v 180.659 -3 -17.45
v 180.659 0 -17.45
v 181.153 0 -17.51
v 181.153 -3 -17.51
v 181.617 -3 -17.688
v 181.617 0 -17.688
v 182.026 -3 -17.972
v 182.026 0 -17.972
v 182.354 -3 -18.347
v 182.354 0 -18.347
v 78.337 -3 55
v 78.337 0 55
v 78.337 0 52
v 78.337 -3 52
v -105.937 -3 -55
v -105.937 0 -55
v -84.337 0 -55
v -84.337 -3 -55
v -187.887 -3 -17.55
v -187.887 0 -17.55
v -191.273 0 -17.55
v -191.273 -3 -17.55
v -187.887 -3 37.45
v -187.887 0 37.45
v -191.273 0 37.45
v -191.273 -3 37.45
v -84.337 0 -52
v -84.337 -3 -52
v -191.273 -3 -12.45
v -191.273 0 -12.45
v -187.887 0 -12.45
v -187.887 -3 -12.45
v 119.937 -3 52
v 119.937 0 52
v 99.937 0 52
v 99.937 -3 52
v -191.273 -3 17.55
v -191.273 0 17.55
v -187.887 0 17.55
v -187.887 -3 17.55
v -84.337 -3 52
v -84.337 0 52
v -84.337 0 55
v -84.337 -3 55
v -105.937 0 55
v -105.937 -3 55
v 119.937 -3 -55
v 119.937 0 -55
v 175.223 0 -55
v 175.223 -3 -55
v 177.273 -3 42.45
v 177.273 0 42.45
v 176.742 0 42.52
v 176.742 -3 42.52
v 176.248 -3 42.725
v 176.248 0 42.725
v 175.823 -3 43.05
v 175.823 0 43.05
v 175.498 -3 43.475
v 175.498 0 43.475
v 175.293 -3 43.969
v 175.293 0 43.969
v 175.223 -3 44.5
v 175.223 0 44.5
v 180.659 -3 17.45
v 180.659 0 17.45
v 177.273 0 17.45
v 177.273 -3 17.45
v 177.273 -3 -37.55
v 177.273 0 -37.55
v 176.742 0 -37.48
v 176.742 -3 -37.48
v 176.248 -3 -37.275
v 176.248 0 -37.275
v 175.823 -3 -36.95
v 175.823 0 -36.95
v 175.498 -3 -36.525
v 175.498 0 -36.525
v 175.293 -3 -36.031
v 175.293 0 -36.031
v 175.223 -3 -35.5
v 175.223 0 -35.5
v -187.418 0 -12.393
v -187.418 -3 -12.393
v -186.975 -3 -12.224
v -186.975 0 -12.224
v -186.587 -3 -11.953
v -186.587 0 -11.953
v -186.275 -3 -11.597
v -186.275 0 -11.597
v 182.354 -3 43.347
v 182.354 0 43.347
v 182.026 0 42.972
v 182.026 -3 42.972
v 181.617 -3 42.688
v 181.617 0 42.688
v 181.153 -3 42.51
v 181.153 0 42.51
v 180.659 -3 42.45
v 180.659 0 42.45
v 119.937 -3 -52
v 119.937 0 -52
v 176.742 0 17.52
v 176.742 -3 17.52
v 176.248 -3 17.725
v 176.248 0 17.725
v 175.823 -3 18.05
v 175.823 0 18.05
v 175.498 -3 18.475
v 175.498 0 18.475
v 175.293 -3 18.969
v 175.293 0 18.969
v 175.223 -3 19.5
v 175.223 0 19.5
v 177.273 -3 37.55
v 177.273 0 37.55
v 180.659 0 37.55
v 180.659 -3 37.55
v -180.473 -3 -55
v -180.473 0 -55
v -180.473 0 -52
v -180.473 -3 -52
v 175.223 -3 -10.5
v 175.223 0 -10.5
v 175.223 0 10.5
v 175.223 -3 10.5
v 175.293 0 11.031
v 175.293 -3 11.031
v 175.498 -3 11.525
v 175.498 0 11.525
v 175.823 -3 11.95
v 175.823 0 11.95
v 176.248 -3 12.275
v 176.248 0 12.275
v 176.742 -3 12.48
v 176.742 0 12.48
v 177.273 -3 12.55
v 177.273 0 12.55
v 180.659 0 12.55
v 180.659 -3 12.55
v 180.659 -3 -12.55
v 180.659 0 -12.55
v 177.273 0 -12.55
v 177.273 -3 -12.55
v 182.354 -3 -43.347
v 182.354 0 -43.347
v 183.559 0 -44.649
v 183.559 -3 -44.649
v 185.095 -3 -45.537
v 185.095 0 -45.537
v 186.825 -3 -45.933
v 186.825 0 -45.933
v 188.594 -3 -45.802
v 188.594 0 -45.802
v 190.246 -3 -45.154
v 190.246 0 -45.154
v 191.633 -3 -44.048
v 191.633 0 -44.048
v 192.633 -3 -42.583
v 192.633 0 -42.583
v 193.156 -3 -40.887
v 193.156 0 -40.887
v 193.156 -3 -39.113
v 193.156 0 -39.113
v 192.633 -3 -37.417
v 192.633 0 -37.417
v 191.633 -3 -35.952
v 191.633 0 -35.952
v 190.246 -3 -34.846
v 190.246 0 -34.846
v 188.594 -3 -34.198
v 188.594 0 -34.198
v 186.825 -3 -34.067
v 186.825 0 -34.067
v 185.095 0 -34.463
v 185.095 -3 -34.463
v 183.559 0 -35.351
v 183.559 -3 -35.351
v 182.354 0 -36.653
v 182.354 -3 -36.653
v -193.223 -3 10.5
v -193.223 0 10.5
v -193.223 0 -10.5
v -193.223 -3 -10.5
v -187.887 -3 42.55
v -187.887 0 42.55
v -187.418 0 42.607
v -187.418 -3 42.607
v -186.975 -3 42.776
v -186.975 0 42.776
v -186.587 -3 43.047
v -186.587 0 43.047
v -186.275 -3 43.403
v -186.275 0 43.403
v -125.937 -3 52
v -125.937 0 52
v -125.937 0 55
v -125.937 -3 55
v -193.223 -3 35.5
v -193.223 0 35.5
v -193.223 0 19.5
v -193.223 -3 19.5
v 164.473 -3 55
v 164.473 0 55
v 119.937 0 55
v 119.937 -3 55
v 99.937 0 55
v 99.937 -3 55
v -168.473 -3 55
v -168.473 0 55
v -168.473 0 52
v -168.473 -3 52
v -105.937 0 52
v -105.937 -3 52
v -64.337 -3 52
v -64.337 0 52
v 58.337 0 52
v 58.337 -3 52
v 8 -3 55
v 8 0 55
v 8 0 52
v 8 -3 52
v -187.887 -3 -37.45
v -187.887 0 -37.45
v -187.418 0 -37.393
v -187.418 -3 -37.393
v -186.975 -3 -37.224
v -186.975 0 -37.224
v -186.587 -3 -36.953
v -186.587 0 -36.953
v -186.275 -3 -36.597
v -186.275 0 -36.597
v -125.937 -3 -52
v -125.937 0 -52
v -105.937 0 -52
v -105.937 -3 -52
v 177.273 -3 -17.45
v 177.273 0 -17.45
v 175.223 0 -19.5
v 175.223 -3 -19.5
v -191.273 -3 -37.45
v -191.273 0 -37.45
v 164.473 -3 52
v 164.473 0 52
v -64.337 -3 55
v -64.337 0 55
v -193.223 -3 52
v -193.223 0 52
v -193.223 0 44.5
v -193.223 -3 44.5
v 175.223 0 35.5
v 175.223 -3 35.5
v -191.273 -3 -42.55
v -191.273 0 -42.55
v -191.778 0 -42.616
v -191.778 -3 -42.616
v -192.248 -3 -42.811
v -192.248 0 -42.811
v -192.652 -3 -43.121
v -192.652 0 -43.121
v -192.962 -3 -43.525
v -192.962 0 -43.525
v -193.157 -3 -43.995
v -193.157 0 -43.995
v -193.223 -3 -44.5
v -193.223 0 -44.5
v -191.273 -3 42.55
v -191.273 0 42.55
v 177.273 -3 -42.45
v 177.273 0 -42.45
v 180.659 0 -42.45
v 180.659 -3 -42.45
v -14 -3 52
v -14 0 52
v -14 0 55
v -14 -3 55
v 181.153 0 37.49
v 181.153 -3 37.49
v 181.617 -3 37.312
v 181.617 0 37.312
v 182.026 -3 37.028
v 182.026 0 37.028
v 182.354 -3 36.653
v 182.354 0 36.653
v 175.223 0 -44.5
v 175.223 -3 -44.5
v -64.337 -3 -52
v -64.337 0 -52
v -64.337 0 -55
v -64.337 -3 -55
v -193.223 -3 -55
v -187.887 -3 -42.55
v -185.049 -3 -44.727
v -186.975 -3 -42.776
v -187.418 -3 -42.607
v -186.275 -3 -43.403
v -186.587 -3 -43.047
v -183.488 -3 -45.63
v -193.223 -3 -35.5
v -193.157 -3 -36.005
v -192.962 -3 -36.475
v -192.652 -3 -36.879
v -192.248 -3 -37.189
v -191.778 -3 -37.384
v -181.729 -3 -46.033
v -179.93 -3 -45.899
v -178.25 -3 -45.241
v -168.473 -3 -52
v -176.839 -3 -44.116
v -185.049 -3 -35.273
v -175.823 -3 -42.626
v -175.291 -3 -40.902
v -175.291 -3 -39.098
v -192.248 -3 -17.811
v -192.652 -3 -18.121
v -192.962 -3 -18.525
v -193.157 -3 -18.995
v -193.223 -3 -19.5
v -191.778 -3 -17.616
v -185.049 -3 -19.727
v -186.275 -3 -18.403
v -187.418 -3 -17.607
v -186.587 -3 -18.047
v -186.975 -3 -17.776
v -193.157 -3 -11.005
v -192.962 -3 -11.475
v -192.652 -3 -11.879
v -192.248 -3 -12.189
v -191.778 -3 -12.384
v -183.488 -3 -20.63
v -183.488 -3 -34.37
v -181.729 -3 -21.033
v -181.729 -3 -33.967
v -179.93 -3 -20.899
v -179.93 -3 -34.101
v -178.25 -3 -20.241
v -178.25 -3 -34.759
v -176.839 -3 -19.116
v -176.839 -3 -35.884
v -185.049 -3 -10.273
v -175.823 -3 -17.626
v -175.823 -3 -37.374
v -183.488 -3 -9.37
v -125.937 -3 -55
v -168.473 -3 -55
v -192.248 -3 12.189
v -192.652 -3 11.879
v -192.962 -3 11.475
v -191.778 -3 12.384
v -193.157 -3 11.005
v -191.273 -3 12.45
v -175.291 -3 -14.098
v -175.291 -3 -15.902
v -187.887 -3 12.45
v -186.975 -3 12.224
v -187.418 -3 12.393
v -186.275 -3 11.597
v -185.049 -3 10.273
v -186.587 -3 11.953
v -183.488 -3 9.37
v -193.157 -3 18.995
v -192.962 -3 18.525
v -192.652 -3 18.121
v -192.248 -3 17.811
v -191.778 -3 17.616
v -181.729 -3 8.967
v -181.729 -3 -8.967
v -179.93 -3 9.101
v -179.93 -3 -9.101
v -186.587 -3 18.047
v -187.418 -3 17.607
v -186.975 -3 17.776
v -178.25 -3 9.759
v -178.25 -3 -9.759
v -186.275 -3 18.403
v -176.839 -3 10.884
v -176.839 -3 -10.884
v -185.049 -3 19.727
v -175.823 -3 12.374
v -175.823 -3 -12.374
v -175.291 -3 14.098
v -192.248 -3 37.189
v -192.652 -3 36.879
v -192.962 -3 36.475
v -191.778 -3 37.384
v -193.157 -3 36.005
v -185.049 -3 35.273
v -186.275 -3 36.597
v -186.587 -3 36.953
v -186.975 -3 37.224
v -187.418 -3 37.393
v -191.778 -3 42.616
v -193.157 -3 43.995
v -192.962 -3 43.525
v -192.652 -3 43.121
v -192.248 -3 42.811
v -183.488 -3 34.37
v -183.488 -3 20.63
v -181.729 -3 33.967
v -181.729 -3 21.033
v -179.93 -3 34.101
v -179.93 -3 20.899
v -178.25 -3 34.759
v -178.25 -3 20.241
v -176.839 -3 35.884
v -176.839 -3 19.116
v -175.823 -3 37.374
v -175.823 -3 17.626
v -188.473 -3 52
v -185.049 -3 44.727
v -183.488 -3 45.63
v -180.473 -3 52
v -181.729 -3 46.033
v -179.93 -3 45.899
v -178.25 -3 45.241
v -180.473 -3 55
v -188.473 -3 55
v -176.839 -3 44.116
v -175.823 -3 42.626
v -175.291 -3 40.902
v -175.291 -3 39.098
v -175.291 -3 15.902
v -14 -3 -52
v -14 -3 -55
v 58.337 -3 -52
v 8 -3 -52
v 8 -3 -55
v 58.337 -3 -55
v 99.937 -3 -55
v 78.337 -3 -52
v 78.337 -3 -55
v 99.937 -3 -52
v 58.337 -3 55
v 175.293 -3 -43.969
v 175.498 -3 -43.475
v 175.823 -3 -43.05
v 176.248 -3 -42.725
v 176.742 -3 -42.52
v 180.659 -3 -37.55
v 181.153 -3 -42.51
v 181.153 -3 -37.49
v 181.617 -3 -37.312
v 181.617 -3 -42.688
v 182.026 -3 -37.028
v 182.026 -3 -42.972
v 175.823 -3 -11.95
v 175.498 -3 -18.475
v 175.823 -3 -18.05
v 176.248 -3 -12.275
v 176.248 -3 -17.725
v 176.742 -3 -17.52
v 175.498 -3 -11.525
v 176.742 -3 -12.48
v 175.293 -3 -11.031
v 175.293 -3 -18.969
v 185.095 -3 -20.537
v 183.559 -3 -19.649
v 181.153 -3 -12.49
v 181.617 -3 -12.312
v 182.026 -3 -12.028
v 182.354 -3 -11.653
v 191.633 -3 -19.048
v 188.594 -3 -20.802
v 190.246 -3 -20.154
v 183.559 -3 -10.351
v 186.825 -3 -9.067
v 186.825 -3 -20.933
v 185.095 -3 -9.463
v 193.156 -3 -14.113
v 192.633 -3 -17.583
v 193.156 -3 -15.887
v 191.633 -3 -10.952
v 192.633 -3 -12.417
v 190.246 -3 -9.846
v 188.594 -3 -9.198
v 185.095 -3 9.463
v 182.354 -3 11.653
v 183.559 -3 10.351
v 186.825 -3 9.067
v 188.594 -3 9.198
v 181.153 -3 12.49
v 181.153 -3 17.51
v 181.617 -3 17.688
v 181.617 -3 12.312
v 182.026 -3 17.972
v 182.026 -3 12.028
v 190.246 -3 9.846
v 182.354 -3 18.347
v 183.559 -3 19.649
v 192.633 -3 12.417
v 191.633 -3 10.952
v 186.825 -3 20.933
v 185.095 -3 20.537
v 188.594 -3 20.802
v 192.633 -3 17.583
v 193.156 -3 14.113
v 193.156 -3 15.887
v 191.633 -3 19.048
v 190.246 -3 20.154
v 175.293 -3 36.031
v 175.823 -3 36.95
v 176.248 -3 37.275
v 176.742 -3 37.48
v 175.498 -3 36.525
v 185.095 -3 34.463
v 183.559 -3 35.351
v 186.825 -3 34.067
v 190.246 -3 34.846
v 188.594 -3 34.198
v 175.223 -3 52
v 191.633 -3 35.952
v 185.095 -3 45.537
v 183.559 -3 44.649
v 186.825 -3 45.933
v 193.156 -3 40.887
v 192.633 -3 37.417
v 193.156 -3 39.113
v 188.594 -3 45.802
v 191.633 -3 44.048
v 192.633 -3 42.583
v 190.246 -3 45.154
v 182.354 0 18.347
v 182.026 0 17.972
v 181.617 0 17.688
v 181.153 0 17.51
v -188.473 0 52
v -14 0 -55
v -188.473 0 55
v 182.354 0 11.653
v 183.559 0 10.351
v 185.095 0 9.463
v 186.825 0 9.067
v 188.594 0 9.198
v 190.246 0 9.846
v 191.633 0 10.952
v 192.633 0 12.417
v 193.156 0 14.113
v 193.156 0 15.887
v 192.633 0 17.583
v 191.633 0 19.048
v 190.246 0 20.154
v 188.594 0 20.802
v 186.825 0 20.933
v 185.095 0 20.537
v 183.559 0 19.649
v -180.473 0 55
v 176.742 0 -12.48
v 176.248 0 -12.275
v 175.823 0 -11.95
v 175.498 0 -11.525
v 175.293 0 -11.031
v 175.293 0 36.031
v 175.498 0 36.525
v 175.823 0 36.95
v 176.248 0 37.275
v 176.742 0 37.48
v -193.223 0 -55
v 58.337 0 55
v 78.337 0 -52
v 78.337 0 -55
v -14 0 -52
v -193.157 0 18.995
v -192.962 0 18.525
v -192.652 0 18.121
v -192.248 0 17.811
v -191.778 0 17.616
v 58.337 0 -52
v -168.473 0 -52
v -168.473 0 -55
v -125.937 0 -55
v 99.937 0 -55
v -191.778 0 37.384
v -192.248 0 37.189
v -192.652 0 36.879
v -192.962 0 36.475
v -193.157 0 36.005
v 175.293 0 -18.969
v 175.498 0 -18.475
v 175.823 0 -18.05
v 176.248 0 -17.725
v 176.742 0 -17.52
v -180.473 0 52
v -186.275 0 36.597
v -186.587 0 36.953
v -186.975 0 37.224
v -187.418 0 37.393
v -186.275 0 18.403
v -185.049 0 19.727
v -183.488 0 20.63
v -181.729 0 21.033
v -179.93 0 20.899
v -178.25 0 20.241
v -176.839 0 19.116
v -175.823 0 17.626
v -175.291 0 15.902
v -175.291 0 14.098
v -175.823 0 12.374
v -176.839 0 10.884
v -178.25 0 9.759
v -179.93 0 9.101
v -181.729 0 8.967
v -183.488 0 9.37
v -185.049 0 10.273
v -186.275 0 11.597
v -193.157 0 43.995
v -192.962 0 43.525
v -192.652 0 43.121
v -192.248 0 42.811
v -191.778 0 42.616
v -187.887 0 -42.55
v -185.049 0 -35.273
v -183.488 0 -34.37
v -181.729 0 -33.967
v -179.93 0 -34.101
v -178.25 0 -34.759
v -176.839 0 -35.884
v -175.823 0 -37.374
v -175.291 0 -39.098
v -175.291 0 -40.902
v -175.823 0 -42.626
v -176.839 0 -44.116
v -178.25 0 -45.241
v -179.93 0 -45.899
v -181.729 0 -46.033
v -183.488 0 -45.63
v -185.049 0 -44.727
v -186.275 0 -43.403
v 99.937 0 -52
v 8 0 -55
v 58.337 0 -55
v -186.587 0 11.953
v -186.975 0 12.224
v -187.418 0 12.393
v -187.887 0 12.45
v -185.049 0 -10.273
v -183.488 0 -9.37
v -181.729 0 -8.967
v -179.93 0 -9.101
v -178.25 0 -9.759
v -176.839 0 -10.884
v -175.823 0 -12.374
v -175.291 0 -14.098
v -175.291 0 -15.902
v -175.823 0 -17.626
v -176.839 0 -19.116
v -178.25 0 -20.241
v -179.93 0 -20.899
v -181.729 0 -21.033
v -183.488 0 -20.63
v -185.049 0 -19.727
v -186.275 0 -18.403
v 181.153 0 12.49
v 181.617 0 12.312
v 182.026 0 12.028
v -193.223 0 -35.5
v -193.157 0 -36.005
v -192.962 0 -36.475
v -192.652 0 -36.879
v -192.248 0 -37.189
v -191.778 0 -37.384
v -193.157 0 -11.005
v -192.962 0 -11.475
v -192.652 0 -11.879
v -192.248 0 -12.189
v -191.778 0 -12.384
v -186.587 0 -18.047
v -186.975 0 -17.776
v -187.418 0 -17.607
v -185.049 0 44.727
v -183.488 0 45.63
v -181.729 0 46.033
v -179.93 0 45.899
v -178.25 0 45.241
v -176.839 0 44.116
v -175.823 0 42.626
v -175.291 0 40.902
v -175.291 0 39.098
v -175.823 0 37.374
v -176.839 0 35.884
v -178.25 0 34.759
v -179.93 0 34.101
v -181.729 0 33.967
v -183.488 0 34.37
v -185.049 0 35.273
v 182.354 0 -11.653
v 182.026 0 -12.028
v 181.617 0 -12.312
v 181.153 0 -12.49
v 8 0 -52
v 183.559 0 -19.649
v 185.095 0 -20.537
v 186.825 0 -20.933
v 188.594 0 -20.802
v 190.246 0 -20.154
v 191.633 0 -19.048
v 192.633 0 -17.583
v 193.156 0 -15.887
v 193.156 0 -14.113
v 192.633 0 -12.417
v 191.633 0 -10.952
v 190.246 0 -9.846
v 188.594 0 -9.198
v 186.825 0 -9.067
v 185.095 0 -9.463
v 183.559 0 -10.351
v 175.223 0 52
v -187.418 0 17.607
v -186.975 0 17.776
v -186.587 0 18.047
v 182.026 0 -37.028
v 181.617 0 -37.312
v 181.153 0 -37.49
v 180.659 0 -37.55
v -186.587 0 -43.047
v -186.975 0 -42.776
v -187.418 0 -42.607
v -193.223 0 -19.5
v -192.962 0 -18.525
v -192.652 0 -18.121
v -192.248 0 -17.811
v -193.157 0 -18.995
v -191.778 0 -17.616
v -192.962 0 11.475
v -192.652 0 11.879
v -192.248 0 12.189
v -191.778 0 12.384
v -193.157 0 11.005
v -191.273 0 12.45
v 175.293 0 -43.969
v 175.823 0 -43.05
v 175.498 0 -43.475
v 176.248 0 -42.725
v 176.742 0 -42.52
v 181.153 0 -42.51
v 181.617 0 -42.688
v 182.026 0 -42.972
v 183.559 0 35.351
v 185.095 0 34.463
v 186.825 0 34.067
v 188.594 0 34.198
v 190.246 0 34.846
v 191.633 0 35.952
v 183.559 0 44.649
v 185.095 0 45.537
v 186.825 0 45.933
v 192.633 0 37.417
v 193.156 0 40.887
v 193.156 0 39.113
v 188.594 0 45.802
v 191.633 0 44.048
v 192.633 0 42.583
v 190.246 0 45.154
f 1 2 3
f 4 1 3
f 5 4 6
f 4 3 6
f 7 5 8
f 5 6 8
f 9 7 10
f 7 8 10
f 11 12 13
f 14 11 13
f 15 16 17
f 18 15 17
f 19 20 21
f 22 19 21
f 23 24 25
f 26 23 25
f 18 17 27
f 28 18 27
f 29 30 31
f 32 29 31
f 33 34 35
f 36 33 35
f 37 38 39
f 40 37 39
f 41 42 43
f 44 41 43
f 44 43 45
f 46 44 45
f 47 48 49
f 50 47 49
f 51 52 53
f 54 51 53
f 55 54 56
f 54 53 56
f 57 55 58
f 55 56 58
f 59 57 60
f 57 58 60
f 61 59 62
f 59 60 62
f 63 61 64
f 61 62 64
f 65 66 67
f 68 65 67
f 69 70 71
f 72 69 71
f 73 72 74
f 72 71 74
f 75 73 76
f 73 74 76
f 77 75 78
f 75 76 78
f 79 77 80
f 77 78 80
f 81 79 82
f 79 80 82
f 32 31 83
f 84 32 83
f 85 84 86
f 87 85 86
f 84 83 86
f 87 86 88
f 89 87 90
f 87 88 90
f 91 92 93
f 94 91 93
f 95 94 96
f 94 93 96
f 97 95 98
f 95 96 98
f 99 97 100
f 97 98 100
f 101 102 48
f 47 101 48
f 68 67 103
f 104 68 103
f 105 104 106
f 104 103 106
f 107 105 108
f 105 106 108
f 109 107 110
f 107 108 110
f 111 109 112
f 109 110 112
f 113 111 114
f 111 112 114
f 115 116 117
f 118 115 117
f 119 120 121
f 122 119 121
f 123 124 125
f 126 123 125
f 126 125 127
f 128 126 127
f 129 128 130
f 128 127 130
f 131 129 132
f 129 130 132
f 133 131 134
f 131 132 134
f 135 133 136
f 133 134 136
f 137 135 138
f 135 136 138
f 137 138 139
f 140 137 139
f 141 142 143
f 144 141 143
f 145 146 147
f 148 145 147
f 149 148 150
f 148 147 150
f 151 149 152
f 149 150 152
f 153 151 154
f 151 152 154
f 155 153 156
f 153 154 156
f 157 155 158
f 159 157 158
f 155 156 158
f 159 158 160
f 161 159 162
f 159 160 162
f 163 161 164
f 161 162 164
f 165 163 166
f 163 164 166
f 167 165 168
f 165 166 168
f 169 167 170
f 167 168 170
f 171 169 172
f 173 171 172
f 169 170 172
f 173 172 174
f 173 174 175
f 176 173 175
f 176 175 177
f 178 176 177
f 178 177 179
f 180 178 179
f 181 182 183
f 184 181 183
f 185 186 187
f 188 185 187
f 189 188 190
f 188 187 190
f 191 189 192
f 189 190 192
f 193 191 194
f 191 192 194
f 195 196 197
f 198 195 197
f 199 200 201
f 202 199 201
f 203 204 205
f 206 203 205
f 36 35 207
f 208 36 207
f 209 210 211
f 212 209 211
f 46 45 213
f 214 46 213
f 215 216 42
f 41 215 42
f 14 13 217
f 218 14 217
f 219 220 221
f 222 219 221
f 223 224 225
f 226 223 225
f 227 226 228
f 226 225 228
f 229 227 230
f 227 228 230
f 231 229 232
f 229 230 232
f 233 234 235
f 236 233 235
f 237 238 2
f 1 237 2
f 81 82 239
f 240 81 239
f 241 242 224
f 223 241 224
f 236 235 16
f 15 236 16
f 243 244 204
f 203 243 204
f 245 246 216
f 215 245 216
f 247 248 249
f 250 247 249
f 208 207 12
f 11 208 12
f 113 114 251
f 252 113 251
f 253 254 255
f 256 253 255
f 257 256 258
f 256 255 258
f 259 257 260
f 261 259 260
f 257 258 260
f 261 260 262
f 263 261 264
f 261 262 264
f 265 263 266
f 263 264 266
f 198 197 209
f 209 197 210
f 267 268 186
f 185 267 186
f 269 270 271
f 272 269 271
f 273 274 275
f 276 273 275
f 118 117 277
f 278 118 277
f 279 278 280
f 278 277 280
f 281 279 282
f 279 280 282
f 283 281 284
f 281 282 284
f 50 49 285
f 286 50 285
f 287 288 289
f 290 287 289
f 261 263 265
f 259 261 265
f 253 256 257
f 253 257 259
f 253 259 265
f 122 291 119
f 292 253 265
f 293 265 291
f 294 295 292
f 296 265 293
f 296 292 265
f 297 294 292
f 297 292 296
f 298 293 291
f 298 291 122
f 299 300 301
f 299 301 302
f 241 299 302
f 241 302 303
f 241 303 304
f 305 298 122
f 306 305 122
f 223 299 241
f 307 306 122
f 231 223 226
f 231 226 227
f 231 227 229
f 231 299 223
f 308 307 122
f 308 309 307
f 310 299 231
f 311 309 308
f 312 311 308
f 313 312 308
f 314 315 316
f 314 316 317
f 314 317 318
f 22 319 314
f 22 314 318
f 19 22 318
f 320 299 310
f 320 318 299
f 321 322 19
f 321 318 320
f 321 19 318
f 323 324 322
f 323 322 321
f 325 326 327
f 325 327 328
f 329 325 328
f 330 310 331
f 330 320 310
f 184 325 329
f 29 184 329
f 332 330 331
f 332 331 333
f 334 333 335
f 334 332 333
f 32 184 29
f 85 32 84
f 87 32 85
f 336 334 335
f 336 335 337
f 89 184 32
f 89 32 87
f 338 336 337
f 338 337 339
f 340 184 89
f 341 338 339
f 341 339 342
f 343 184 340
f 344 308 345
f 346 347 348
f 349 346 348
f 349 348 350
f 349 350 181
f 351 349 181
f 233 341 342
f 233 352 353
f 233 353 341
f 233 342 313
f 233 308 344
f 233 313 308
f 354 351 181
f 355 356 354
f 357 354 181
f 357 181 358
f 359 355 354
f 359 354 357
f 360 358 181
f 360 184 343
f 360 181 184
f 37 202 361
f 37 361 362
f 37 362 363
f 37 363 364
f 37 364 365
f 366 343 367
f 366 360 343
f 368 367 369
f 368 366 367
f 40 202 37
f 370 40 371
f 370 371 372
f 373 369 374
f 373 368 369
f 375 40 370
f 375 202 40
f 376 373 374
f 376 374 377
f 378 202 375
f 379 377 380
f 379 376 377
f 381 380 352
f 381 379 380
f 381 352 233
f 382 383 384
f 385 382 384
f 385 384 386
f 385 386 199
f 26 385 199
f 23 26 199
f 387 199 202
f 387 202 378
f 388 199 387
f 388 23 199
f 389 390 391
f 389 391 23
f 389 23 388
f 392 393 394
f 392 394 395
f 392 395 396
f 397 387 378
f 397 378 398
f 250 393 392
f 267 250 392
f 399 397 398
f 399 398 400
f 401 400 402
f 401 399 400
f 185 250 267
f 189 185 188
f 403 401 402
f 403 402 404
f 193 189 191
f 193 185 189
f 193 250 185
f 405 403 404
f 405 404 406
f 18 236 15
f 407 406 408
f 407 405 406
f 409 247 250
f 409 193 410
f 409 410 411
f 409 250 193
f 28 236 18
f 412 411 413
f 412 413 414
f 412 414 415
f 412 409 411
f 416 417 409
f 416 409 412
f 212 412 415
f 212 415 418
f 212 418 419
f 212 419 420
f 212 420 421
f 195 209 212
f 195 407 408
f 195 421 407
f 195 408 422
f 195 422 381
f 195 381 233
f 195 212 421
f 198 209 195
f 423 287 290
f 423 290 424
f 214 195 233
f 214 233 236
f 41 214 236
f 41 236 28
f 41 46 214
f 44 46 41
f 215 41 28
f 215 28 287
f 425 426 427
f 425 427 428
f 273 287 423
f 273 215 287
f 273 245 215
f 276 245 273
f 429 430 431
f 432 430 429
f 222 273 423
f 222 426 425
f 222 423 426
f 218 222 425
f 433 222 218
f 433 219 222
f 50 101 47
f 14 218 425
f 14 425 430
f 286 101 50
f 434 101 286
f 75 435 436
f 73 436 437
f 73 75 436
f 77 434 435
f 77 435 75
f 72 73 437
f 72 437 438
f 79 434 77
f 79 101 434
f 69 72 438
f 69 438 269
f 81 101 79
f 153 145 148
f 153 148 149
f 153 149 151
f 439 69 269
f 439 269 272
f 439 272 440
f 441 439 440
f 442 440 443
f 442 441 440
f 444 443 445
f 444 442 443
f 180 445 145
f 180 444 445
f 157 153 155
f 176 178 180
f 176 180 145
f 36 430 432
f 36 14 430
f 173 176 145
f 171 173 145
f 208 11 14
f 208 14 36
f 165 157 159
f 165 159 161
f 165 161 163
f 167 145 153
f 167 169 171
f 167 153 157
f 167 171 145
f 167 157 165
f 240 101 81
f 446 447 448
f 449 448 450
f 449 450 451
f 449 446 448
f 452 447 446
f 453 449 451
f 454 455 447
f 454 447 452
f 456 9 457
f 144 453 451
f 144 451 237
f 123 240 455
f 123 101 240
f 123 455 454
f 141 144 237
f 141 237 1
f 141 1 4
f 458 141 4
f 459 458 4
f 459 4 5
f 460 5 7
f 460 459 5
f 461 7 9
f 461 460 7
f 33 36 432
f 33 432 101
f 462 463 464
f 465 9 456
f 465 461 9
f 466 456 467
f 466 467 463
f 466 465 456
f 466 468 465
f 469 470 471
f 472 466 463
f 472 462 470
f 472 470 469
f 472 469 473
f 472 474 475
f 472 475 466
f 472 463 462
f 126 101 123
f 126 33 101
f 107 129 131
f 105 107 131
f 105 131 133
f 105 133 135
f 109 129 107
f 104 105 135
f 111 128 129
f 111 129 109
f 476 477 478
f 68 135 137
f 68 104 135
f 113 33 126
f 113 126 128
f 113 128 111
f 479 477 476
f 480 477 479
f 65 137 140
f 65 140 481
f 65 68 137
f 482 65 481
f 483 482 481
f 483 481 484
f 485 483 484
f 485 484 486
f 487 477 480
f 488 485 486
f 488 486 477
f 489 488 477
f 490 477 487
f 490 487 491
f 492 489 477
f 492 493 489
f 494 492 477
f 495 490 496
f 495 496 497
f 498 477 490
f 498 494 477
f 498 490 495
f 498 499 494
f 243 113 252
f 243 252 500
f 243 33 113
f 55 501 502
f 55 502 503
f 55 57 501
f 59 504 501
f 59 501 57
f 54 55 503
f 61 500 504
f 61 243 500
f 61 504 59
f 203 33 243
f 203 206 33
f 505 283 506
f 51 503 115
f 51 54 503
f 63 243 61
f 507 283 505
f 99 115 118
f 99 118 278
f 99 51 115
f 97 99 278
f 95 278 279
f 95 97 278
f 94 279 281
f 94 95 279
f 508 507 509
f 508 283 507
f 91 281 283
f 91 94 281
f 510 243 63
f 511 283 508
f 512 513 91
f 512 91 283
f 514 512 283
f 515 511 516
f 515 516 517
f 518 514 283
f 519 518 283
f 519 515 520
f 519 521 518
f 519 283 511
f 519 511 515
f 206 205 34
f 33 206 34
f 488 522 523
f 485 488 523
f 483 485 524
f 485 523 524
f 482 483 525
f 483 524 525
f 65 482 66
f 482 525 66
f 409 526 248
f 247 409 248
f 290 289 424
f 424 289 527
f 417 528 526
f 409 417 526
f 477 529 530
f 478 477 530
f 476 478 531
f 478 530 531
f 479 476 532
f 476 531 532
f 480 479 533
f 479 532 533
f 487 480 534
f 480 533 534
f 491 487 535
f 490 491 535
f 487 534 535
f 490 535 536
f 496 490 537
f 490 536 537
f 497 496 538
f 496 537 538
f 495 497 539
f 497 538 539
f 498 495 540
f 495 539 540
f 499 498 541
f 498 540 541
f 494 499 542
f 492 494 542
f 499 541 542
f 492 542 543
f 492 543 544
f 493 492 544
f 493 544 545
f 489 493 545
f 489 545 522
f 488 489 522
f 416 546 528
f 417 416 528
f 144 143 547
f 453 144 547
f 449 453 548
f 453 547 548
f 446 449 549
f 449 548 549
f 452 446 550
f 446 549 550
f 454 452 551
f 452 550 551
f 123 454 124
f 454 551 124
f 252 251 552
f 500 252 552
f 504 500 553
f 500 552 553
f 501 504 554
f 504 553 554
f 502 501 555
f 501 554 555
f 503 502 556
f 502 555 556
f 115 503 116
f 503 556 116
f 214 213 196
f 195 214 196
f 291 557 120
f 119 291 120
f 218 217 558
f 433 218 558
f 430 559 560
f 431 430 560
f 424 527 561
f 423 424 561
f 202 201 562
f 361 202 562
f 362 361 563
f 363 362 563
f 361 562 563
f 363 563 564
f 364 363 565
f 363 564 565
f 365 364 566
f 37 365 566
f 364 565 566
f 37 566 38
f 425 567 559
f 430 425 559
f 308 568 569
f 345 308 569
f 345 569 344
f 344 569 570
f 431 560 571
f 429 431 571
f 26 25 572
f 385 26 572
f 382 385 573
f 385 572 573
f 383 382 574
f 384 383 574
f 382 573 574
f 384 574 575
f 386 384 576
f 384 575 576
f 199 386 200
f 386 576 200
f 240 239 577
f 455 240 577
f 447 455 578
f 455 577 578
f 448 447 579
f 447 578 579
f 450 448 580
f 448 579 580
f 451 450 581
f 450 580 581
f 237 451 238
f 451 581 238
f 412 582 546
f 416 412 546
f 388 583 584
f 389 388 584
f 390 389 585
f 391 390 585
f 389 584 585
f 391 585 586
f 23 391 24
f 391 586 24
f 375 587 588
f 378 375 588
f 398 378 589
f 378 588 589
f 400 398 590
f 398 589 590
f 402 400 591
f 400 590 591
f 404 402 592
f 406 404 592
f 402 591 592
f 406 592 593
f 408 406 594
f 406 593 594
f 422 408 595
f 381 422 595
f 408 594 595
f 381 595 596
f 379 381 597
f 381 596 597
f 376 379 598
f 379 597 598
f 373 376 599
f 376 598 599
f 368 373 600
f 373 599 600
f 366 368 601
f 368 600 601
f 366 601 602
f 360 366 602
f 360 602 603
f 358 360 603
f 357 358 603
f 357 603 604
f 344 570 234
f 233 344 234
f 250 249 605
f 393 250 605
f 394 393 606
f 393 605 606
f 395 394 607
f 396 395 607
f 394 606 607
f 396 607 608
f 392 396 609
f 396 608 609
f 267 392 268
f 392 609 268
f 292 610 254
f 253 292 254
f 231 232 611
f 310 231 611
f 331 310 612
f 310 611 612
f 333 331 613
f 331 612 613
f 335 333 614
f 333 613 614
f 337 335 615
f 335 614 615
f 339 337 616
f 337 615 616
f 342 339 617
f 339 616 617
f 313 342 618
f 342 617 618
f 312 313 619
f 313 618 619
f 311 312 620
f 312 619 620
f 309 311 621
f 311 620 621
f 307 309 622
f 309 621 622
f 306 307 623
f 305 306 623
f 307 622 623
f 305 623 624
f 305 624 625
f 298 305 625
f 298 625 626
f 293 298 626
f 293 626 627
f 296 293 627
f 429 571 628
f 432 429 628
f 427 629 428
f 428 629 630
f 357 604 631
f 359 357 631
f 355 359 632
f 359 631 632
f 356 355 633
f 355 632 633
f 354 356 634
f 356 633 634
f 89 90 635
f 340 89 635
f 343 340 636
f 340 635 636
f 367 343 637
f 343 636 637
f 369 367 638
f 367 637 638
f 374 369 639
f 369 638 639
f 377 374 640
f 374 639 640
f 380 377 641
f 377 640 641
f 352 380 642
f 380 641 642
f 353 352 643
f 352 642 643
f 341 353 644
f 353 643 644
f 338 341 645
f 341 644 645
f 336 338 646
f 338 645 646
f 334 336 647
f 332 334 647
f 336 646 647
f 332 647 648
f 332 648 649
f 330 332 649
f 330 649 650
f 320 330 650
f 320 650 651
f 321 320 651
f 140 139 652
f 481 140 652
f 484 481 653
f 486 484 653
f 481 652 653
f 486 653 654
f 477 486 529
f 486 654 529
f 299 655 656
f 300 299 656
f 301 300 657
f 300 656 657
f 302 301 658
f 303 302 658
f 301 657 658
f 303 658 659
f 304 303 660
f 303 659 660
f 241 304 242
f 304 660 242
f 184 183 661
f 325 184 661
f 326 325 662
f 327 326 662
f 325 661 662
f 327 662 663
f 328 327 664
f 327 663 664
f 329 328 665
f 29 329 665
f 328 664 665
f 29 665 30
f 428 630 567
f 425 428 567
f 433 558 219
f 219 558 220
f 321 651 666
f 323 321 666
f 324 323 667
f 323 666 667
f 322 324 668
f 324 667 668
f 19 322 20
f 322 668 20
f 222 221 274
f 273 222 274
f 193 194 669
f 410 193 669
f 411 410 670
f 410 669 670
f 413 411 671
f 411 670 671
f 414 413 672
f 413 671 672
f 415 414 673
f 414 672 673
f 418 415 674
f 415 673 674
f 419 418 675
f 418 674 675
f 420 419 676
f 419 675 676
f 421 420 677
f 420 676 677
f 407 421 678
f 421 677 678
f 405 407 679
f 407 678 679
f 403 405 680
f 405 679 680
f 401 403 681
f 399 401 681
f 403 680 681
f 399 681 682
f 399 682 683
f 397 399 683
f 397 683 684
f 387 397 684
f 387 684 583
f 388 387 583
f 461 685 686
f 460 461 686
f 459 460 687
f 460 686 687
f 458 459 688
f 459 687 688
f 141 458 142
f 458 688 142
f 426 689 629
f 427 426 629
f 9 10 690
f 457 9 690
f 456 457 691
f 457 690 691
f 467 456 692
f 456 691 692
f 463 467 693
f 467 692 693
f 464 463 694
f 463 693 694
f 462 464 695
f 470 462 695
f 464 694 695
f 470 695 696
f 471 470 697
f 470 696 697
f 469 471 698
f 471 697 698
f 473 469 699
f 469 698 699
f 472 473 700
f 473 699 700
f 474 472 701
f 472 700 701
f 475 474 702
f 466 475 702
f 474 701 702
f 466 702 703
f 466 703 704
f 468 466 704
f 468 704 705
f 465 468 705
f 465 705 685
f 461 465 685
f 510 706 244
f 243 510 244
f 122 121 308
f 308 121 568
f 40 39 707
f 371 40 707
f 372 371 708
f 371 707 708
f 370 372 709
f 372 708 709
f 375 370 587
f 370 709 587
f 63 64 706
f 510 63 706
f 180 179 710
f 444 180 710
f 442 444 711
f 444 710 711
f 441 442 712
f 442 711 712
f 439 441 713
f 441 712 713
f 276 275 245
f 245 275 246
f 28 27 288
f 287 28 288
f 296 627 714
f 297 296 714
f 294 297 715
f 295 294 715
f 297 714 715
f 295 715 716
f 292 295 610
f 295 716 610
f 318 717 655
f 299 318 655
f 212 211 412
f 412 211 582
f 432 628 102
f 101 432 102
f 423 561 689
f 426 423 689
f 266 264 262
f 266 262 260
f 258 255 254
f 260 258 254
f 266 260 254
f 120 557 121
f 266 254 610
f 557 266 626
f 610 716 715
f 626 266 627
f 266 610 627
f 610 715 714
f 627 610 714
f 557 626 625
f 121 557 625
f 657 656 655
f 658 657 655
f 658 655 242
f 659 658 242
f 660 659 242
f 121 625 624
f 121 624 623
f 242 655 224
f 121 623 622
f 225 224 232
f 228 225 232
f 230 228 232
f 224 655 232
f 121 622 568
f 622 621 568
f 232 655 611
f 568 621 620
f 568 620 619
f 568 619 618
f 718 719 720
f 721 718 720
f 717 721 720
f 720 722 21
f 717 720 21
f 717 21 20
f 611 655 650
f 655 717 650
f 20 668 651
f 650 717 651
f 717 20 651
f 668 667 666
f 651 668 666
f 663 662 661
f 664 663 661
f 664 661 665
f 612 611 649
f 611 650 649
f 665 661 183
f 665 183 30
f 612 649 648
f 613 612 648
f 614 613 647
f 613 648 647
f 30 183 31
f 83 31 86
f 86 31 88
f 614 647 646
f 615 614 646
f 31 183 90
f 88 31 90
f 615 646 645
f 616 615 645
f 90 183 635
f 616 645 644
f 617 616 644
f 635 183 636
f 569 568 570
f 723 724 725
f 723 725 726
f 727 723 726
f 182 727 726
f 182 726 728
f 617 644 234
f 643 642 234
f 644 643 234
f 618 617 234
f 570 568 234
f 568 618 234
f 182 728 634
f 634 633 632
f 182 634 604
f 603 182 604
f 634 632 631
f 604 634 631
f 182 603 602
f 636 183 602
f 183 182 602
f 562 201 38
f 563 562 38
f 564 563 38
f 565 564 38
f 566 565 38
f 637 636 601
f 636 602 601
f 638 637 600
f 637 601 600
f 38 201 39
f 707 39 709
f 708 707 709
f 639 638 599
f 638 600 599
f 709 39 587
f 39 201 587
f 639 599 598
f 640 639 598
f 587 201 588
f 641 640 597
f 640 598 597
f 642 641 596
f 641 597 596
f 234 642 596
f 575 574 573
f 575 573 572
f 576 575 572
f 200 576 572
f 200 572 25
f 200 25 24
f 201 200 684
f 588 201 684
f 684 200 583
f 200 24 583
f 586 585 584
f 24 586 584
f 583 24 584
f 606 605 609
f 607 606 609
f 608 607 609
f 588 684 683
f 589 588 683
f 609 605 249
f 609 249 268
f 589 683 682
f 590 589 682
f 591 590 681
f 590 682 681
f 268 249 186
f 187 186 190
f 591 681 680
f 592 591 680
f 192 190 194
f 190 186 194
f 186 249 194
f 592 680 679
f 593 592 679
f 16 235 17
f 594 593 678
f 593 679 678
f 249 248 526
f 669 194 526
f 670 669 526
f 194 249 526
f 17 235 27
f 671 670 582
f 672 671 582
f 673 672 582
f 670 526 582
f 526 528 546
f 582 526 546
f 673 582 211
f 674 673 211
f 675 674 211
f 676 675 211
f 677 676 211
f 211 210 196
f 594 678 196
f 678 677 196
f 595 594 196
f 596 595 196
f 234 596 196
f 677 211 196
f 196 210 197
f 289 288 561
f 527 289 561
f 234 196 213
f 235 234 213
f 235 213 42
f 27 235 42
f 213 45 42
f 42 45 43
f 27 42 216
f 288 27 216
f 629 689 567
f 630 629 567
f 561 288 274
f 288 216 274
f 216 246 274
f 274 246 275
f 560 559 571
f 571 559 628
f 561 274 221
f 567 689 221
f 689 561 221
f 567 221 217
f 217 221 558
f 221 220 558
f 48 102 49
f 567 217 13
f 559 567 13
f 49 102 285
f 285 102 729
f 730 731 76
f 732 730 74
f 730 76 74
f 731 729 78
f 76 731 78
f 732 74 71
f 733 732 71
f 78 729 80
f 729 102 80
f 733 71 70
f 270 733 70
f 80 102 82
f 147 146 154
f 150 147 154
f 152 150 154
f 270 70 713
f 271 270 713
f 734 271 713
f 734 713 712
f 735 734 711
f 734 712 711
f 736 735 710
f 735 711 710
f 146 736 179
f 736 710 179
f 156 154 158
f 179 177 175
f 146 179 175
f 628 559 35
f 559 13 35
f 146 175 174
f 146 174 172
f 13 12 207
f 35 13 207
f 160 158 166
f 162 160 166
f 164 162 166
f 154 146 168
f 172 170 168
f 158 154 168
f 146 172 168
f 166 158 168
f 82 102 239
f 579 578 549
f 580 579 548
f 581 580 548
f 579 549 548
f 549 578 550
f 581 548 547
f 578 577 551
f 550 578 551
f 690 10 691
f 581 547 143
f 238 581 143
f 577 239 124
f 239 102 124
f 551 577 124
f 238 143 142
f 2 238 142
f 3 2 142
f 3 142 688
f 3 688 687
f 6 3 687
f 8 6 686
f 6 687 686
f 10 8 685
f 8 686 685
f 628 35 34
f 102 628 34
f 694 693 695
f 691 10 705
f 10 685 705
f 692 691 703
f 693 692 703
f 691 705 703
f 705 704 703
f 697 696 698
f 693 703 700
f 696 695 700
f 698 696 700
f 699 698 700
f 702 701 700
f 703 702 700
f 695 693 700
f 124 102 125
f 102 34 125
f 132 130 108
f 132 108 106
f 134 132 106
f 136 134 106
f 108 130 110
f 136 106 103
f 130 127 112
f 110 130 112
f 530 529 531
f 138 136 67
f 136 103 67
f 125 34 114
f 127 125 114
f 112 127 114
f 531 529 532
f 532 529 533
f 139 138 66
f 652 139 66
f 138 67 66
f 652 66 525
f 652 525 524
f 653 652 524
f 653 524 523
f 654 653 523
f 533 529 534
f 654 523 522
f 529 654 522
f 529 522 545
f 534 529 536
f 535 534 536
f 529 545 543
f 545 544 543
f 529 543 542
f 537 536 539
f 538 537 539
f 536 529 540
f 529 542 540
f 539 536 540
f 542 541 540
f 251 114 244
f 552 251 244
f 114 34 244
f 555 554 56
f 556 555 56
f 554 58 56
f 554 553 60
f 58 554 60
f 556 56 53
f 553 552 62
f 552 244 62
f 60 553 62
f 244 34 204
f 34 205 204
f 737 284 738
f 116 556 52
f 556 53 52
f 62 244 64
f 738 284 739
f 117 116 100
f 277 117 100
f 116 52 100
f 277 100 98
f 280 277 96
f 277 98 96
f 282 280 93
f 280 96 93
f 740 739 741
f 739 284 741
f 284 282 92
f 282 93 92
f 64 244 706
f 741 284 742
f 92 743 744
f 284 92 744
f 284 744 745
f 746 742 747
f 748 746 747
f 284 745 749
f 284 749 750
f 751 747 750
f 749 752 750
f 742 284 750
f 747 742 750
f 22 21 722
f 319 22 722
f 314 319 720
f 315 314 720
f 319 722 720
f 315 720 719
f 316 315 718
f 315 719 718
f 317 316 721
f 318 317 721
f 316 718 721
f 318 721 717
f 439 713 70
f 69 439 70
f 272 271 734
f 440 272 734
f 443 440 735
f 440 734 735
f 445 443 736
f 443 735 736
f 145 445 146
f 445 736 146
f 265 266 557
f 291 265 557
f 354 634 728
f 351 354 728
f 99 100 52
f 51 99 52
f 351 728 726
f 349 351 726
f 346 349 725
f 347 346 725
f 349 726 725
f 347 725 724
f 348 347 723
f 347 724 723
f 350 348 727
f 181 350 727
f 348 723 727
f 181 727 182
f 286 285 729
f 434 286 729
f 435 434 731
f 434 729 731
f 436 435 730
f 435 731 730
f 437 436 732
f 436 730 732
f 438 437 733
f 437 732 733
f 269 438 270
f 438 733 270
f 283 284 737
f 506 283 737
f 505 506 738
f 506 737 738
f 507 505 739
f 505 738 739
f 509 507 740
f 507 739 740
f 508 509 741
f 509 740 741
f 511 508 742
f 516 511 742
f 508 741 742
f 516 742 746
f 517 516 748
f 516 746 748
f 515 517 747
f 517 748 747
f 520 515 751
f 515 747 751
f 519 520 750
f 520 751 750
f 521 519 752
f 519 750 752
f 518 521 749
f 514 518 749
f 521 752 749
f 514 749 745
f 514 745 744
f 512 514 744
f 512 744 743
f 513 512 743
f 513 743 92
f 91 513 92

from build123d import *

# Parameters (mm, degrees)
F0_W     = 16.768251
F0_H     = 110
F0_W_2   = 16.76825
F1_DEPTH = 3


# Not quite as in the source:
# - ends of sketch curves that miss each other by under 0.0002 mm in the source are joined


with BuildPart() as f1:
    # F0 (on Front) → F1 (new body)
    with BuildSketch(Plane.XZ):
        with BuildLine():
            Line((-165.473004, -55), (-165.473004, 55))
            Line((-165.473004, 55), (-168.473004, 55))
            Line((-168.473004, 55), (-168.473004, 52))
            Line((-168.473004, 52), (-180.473004, 52))
            Line((-180.473004, 52), (-180.473004, 55))
            Line((-180.473004, 55), (-188.473004, 55))
            Line((-188.473004, 55), (-188.473004, 52))
            Line((-188.473004, 52), (-193.223004, 52))
            Line((-193.223004, 52), (-193.223004, 44.5))
            ThreePointArc((-193.223004, 44.5), (-192.6518622233, 43.1211417767), (-191.273004, 42.55))
            Line((-191.273004, 42.55), (-187.887382, 42.55))
            ThreePointArc((-187.887382, 42.55), (-186.9753529387, 42.7764272596), (-186.2751272015, 43.4031251371))
            ThreePointArc((-186.2751272015, 43.4031251371), (-175.223004, 40), (-186.2751273913, 36.5968747338))
            ThreePointArc((-186.2751273913, 36.5968747338), (-186.9753529387, 37.2235727404), (-187.887382, 37.45))
            Line((-187.887382, 37.45), (-191.273004, 37.45))
            ThreePointArc((-191.273004, 37.45), (-192.6518622233, 36.8788582233), (-193.223004, 35.5))
            Line((-193.223004, 35.5), (-193.223004, 19.5))
            ThreePointArc((-193.223004, 19.5), (-192.6518622233, 18.1211417767), (-191.273004, 17.55))
            Line((-191.273004, 17.55), (-187.887382, 17.55))
            ThreePointArc((-187.887382, 17.55), (-186.9753529387, 17.7764272596), (-186.2751272015, 18.4031251371))
            ThreePointArc((-186.2751272015, 18.4031251371), (-175.223004, 15), (-186.2751273913, 11.5968747338))
            ThreePointArc((-186.2751273913, 11.5968747338), (-186.9753529387, 12.2235727404), (-187.887382, 12.45))
            Line((-187.887382, 12.45), (-191.273004, 12.45))
            ThreePointArc((-191.273004, 12.45), (-192.6518622233, 11.8788582233), (-193.223004, 10.5))
            Line((-193.223004, 10.5), (-193.223004, -10.5))
            ThreePointArc((-193.223004, -10.5), (-192.6518622233, -11.8788582233), (-191.273004, -12.45))
            Line((-191.273004, -12.45), (-187.887382, -12.45))
            ThreePointArc((-187.887382, -12.45), (-186.9753529387, -12.2235727404), (-186.2751272015, -11.5968748629))
            ThreePointArc((-186.2751272015, -11.5968748629), (-175.223004, -15), (-186.2751273913, -18.4031252662))
            ThreePointArc((-186.2751273913, -18.4031252662), (-186.9753529387, -17.7764272596), (-187.887382, -17.55))
            Line((-187.887382, -17.55), (-191.273004, -17.55))
            ThreePointArc((-191.273004, -17.55), (-192.6518622233, -18.1211417767), (-193.223004, -19.5))
            Line((-193.223004, -19.5), (-193.223004, -35.5))
            ThreePointArc((-193.223004, -35.5), (-192.6518622233, -36.8788582233), (-191.273004, -37.45))
            Line((-191.273004, -37.45), (-187.887382, -37.45))
            ThreePointArc((-187.887382, -37.45), (-186.9753529387, -37.2235727404), (-186.2751272015, -36.5968748629))
            ThreePointArc((-186.2751272015, -36.5968748629), (-175.223004, -40), (-186.2751273913, -43.4031252662))
            ThreePointArc((-186.2751273913, -43.4031252662), (-186.9753529387, -42.7764272596), (-187.887382, -42.55))
            Line((-187.887382, -42.55), (-191.273004, -42.55))
            ThreePointArc((-191.273004, -42.55), (-192.6518622233, -43.1211417767), (-193.223004, -44.5))
            Line((-193.223004, -44.5), (-193.223004, -55))
            Line((-193.223004, -55), (-180.473004, -55))
            Line((-180.473004, -55), (-180.473004, -52))
            Line((-180.473004, -52), (-168.473004, -52))
            Line((-168.473004, -52), (-168.473004, -55))
            Line((-168.473004, -55), (-165.473004, -55))
        make_face()
        with Locations((-157.0888785, 0)):
            Rectangle(F0_W, F0_H)
        with Locations((-140.3206275, 0)):
            Rectangle(F0_W, F0_H)
        Polygon((-58.336502, -55), (-58.336502, 55), (-64.336502, 55), (-64.336502, 52), (-84.336502, 52), (-84.336502, 55), (-105.936502, 55), (-105.936502, 52), (-125.936502, 52), (-125.936502, 55), (-131.936502, 55), (-131.936502, -55), (-125.936502, -55), (-125.936502, -52), (-105.936502, -52), (-105.936502, -55), (-84.336502, -55), (-84.336502, -52), (-64.336502, -52), (-64.336502, -55), align=None)
        with Locations((-33.1841255, 0)):
            Rectangle(F0_W, F0_H)
        Polygon((18.8, -55), (18.8, 55), (8, 55), (8, 52), (-14, 52), (-14, 55), (-24.8, 55), (-24.8, -55), (-14, -55), (-14, -52), (8, -52), (8, -55), align=None)
        with Locations((27.184125, 0)):
            Rectangle(F0_W_2, F0_H)
        with Locations((43.9523755, 0)):
            Rectangle(F0_W, F0_H)
        Polygon((125.936501, -55), (125.936501, 55), (119.936501, 55), (119.936501, 52), (99.936501, 52), (99.936501, 55), (78.336501, 55), (78.336501, 52), (58.336501, 52), (58.336501, 55), (52.336501, 55), (52.336501, -55), (58.336501, -55), (58.336501, -52), (78.336501, -52), (78.336501, -55), (99.936501, -55), (99.936501, -52), (119.936501, -52), (119.936501, -55), align=None)
        with Locations((134.3206265, 0)):
            Rectangle(F0_W, F0_H)
        with Locations((151.0888775, 0)):
            Rectangle(F0_W, F0_H)
        with BuildLine():
            Line((164.473003, 55), (159.473003, 55))
            Line((159.473003, 55), (159.473003, -55))
            Line((159.473003, -55), (175.223003, -55))
            Line((175.223003, -55), (175.223003, -44.5))
            ThreePointArc((175.223003, -44.5), (175.8234340986, -43.0504310986), (177.273003, -42.45))
            Line((177.273003, -42.45), (180.658624, -42.45))
            ThreePointArc((180.658624, -42.45), (181.6174238462, -42.6880389477), (182.3535586128, -43.3468752634))
            ThreePointArc((182.3535586128, -43.3468752634), (193.223003, -40), (182.3535591066, -36.6531250725))
            ThreePointArc((182.3535591066, -36.6531250725), (181.6174238462, -37.3119610523), (180.658624, -37.55))
            Line((180.658624, -37.55), (177.273003, -37.55))
            ThreePointArc((177.273003, -37.55), (175.8234340986, -36.9495689014), (175.223003, -35.5))
            Line((175.223003, -35.5), (175.223003, -19.5))
            ThreePointArc((175.223003, -19.5), (175.8234340986, -18.0504310986), (177.273003, -17.45))
            Line((177.273003, -17.45), (180.658624, -17.45))
            ThreePointArc((180.658624, -17.45), (181.6174238462, -17.6880389477), (182.3535586128, -18.3468752634))
            ThreePointArc((182.3535586128, -18.3468752634), (193.223003, -15), (182.3535591066, -11.6531250725))
            ThreePointArc((182.3535591066, -11.6531250725), (181.6174238462, -12.3119610523), (180.658624, -12.55))
            Line((180.658624, -12.55), (177.273003, -12.55))
            ThreePointArc((177.273003, -12.55), (175.8234340986, -11.9495689014), (175.223003, -10.5))
            Line((175.223003, -10.5), (175.223003, 10.5))
            ThreePointArc((175.223003, 10.5), (175.8234340986, 11.9495689014), (177.273003, 12.55))
            Line((177.273003, 12.55), (180.658624, 12.55))
            ThreePointArc((180.658624, 12.55), (181.6174238462, 12.3119610523), (182.3535586128, 11.6531247366))
            ThreePointArc((182.3535586128, 11.6531247366), (193.223003, 15), (182.3535591066, 18.3468749275))
            ThreePointArc((182.3535591066, 18.3468749275), (181.6174238462, 17.6880389477), (180.658624, 17.45))
            Line((180.658624, 17.45), (177.273003, 17.45))
            ThreePointArc((177.273003, 17.45), (175.8234340986, 18.0504310986), (175.223003, 19.5))
            Line((175.223003, 19.5), (175.223003, 35.5))
            ThreePointArc((175.223003, 35.5), (175.8234340986, 36.9495689014), (177.273003, 37.55))
            Line((177.273003, 37.55), (180.658624, 37.55))
            ThreePointArc((180.658624, 37.55), (181.6174238462, 37.3119610523), (182.3535586128, 36.6531247366))
            ThreePointArc((182.3535586128, 36.6531247366), (193.223003, 40), (182.3535591066, 43.3468749275))
            ThreePointArc((182.3535591066, 43.3468749275), (181.6174238462, 42.6880389477), (180.658624, 42.45))
            Line((180.658624, 42.45), (177.273003, 42.45))
            ThreePointArc((177.273003, 42.45), (175.8234340986, 43.0504310986), (175.223003, 44.5))
            Line((175.223003, 44.5), (175.223003, 52))
            Line((175.223003, 52), (164.473003, 52))
            Line((164.473003, 52), (164.473003, 55))
        make_face()
        with Locations((-49.9523765, 0)):
            Rectangle(F0_W, F0_H)
    extrude(amount=F1_DEPTH)


solid = f1.part
